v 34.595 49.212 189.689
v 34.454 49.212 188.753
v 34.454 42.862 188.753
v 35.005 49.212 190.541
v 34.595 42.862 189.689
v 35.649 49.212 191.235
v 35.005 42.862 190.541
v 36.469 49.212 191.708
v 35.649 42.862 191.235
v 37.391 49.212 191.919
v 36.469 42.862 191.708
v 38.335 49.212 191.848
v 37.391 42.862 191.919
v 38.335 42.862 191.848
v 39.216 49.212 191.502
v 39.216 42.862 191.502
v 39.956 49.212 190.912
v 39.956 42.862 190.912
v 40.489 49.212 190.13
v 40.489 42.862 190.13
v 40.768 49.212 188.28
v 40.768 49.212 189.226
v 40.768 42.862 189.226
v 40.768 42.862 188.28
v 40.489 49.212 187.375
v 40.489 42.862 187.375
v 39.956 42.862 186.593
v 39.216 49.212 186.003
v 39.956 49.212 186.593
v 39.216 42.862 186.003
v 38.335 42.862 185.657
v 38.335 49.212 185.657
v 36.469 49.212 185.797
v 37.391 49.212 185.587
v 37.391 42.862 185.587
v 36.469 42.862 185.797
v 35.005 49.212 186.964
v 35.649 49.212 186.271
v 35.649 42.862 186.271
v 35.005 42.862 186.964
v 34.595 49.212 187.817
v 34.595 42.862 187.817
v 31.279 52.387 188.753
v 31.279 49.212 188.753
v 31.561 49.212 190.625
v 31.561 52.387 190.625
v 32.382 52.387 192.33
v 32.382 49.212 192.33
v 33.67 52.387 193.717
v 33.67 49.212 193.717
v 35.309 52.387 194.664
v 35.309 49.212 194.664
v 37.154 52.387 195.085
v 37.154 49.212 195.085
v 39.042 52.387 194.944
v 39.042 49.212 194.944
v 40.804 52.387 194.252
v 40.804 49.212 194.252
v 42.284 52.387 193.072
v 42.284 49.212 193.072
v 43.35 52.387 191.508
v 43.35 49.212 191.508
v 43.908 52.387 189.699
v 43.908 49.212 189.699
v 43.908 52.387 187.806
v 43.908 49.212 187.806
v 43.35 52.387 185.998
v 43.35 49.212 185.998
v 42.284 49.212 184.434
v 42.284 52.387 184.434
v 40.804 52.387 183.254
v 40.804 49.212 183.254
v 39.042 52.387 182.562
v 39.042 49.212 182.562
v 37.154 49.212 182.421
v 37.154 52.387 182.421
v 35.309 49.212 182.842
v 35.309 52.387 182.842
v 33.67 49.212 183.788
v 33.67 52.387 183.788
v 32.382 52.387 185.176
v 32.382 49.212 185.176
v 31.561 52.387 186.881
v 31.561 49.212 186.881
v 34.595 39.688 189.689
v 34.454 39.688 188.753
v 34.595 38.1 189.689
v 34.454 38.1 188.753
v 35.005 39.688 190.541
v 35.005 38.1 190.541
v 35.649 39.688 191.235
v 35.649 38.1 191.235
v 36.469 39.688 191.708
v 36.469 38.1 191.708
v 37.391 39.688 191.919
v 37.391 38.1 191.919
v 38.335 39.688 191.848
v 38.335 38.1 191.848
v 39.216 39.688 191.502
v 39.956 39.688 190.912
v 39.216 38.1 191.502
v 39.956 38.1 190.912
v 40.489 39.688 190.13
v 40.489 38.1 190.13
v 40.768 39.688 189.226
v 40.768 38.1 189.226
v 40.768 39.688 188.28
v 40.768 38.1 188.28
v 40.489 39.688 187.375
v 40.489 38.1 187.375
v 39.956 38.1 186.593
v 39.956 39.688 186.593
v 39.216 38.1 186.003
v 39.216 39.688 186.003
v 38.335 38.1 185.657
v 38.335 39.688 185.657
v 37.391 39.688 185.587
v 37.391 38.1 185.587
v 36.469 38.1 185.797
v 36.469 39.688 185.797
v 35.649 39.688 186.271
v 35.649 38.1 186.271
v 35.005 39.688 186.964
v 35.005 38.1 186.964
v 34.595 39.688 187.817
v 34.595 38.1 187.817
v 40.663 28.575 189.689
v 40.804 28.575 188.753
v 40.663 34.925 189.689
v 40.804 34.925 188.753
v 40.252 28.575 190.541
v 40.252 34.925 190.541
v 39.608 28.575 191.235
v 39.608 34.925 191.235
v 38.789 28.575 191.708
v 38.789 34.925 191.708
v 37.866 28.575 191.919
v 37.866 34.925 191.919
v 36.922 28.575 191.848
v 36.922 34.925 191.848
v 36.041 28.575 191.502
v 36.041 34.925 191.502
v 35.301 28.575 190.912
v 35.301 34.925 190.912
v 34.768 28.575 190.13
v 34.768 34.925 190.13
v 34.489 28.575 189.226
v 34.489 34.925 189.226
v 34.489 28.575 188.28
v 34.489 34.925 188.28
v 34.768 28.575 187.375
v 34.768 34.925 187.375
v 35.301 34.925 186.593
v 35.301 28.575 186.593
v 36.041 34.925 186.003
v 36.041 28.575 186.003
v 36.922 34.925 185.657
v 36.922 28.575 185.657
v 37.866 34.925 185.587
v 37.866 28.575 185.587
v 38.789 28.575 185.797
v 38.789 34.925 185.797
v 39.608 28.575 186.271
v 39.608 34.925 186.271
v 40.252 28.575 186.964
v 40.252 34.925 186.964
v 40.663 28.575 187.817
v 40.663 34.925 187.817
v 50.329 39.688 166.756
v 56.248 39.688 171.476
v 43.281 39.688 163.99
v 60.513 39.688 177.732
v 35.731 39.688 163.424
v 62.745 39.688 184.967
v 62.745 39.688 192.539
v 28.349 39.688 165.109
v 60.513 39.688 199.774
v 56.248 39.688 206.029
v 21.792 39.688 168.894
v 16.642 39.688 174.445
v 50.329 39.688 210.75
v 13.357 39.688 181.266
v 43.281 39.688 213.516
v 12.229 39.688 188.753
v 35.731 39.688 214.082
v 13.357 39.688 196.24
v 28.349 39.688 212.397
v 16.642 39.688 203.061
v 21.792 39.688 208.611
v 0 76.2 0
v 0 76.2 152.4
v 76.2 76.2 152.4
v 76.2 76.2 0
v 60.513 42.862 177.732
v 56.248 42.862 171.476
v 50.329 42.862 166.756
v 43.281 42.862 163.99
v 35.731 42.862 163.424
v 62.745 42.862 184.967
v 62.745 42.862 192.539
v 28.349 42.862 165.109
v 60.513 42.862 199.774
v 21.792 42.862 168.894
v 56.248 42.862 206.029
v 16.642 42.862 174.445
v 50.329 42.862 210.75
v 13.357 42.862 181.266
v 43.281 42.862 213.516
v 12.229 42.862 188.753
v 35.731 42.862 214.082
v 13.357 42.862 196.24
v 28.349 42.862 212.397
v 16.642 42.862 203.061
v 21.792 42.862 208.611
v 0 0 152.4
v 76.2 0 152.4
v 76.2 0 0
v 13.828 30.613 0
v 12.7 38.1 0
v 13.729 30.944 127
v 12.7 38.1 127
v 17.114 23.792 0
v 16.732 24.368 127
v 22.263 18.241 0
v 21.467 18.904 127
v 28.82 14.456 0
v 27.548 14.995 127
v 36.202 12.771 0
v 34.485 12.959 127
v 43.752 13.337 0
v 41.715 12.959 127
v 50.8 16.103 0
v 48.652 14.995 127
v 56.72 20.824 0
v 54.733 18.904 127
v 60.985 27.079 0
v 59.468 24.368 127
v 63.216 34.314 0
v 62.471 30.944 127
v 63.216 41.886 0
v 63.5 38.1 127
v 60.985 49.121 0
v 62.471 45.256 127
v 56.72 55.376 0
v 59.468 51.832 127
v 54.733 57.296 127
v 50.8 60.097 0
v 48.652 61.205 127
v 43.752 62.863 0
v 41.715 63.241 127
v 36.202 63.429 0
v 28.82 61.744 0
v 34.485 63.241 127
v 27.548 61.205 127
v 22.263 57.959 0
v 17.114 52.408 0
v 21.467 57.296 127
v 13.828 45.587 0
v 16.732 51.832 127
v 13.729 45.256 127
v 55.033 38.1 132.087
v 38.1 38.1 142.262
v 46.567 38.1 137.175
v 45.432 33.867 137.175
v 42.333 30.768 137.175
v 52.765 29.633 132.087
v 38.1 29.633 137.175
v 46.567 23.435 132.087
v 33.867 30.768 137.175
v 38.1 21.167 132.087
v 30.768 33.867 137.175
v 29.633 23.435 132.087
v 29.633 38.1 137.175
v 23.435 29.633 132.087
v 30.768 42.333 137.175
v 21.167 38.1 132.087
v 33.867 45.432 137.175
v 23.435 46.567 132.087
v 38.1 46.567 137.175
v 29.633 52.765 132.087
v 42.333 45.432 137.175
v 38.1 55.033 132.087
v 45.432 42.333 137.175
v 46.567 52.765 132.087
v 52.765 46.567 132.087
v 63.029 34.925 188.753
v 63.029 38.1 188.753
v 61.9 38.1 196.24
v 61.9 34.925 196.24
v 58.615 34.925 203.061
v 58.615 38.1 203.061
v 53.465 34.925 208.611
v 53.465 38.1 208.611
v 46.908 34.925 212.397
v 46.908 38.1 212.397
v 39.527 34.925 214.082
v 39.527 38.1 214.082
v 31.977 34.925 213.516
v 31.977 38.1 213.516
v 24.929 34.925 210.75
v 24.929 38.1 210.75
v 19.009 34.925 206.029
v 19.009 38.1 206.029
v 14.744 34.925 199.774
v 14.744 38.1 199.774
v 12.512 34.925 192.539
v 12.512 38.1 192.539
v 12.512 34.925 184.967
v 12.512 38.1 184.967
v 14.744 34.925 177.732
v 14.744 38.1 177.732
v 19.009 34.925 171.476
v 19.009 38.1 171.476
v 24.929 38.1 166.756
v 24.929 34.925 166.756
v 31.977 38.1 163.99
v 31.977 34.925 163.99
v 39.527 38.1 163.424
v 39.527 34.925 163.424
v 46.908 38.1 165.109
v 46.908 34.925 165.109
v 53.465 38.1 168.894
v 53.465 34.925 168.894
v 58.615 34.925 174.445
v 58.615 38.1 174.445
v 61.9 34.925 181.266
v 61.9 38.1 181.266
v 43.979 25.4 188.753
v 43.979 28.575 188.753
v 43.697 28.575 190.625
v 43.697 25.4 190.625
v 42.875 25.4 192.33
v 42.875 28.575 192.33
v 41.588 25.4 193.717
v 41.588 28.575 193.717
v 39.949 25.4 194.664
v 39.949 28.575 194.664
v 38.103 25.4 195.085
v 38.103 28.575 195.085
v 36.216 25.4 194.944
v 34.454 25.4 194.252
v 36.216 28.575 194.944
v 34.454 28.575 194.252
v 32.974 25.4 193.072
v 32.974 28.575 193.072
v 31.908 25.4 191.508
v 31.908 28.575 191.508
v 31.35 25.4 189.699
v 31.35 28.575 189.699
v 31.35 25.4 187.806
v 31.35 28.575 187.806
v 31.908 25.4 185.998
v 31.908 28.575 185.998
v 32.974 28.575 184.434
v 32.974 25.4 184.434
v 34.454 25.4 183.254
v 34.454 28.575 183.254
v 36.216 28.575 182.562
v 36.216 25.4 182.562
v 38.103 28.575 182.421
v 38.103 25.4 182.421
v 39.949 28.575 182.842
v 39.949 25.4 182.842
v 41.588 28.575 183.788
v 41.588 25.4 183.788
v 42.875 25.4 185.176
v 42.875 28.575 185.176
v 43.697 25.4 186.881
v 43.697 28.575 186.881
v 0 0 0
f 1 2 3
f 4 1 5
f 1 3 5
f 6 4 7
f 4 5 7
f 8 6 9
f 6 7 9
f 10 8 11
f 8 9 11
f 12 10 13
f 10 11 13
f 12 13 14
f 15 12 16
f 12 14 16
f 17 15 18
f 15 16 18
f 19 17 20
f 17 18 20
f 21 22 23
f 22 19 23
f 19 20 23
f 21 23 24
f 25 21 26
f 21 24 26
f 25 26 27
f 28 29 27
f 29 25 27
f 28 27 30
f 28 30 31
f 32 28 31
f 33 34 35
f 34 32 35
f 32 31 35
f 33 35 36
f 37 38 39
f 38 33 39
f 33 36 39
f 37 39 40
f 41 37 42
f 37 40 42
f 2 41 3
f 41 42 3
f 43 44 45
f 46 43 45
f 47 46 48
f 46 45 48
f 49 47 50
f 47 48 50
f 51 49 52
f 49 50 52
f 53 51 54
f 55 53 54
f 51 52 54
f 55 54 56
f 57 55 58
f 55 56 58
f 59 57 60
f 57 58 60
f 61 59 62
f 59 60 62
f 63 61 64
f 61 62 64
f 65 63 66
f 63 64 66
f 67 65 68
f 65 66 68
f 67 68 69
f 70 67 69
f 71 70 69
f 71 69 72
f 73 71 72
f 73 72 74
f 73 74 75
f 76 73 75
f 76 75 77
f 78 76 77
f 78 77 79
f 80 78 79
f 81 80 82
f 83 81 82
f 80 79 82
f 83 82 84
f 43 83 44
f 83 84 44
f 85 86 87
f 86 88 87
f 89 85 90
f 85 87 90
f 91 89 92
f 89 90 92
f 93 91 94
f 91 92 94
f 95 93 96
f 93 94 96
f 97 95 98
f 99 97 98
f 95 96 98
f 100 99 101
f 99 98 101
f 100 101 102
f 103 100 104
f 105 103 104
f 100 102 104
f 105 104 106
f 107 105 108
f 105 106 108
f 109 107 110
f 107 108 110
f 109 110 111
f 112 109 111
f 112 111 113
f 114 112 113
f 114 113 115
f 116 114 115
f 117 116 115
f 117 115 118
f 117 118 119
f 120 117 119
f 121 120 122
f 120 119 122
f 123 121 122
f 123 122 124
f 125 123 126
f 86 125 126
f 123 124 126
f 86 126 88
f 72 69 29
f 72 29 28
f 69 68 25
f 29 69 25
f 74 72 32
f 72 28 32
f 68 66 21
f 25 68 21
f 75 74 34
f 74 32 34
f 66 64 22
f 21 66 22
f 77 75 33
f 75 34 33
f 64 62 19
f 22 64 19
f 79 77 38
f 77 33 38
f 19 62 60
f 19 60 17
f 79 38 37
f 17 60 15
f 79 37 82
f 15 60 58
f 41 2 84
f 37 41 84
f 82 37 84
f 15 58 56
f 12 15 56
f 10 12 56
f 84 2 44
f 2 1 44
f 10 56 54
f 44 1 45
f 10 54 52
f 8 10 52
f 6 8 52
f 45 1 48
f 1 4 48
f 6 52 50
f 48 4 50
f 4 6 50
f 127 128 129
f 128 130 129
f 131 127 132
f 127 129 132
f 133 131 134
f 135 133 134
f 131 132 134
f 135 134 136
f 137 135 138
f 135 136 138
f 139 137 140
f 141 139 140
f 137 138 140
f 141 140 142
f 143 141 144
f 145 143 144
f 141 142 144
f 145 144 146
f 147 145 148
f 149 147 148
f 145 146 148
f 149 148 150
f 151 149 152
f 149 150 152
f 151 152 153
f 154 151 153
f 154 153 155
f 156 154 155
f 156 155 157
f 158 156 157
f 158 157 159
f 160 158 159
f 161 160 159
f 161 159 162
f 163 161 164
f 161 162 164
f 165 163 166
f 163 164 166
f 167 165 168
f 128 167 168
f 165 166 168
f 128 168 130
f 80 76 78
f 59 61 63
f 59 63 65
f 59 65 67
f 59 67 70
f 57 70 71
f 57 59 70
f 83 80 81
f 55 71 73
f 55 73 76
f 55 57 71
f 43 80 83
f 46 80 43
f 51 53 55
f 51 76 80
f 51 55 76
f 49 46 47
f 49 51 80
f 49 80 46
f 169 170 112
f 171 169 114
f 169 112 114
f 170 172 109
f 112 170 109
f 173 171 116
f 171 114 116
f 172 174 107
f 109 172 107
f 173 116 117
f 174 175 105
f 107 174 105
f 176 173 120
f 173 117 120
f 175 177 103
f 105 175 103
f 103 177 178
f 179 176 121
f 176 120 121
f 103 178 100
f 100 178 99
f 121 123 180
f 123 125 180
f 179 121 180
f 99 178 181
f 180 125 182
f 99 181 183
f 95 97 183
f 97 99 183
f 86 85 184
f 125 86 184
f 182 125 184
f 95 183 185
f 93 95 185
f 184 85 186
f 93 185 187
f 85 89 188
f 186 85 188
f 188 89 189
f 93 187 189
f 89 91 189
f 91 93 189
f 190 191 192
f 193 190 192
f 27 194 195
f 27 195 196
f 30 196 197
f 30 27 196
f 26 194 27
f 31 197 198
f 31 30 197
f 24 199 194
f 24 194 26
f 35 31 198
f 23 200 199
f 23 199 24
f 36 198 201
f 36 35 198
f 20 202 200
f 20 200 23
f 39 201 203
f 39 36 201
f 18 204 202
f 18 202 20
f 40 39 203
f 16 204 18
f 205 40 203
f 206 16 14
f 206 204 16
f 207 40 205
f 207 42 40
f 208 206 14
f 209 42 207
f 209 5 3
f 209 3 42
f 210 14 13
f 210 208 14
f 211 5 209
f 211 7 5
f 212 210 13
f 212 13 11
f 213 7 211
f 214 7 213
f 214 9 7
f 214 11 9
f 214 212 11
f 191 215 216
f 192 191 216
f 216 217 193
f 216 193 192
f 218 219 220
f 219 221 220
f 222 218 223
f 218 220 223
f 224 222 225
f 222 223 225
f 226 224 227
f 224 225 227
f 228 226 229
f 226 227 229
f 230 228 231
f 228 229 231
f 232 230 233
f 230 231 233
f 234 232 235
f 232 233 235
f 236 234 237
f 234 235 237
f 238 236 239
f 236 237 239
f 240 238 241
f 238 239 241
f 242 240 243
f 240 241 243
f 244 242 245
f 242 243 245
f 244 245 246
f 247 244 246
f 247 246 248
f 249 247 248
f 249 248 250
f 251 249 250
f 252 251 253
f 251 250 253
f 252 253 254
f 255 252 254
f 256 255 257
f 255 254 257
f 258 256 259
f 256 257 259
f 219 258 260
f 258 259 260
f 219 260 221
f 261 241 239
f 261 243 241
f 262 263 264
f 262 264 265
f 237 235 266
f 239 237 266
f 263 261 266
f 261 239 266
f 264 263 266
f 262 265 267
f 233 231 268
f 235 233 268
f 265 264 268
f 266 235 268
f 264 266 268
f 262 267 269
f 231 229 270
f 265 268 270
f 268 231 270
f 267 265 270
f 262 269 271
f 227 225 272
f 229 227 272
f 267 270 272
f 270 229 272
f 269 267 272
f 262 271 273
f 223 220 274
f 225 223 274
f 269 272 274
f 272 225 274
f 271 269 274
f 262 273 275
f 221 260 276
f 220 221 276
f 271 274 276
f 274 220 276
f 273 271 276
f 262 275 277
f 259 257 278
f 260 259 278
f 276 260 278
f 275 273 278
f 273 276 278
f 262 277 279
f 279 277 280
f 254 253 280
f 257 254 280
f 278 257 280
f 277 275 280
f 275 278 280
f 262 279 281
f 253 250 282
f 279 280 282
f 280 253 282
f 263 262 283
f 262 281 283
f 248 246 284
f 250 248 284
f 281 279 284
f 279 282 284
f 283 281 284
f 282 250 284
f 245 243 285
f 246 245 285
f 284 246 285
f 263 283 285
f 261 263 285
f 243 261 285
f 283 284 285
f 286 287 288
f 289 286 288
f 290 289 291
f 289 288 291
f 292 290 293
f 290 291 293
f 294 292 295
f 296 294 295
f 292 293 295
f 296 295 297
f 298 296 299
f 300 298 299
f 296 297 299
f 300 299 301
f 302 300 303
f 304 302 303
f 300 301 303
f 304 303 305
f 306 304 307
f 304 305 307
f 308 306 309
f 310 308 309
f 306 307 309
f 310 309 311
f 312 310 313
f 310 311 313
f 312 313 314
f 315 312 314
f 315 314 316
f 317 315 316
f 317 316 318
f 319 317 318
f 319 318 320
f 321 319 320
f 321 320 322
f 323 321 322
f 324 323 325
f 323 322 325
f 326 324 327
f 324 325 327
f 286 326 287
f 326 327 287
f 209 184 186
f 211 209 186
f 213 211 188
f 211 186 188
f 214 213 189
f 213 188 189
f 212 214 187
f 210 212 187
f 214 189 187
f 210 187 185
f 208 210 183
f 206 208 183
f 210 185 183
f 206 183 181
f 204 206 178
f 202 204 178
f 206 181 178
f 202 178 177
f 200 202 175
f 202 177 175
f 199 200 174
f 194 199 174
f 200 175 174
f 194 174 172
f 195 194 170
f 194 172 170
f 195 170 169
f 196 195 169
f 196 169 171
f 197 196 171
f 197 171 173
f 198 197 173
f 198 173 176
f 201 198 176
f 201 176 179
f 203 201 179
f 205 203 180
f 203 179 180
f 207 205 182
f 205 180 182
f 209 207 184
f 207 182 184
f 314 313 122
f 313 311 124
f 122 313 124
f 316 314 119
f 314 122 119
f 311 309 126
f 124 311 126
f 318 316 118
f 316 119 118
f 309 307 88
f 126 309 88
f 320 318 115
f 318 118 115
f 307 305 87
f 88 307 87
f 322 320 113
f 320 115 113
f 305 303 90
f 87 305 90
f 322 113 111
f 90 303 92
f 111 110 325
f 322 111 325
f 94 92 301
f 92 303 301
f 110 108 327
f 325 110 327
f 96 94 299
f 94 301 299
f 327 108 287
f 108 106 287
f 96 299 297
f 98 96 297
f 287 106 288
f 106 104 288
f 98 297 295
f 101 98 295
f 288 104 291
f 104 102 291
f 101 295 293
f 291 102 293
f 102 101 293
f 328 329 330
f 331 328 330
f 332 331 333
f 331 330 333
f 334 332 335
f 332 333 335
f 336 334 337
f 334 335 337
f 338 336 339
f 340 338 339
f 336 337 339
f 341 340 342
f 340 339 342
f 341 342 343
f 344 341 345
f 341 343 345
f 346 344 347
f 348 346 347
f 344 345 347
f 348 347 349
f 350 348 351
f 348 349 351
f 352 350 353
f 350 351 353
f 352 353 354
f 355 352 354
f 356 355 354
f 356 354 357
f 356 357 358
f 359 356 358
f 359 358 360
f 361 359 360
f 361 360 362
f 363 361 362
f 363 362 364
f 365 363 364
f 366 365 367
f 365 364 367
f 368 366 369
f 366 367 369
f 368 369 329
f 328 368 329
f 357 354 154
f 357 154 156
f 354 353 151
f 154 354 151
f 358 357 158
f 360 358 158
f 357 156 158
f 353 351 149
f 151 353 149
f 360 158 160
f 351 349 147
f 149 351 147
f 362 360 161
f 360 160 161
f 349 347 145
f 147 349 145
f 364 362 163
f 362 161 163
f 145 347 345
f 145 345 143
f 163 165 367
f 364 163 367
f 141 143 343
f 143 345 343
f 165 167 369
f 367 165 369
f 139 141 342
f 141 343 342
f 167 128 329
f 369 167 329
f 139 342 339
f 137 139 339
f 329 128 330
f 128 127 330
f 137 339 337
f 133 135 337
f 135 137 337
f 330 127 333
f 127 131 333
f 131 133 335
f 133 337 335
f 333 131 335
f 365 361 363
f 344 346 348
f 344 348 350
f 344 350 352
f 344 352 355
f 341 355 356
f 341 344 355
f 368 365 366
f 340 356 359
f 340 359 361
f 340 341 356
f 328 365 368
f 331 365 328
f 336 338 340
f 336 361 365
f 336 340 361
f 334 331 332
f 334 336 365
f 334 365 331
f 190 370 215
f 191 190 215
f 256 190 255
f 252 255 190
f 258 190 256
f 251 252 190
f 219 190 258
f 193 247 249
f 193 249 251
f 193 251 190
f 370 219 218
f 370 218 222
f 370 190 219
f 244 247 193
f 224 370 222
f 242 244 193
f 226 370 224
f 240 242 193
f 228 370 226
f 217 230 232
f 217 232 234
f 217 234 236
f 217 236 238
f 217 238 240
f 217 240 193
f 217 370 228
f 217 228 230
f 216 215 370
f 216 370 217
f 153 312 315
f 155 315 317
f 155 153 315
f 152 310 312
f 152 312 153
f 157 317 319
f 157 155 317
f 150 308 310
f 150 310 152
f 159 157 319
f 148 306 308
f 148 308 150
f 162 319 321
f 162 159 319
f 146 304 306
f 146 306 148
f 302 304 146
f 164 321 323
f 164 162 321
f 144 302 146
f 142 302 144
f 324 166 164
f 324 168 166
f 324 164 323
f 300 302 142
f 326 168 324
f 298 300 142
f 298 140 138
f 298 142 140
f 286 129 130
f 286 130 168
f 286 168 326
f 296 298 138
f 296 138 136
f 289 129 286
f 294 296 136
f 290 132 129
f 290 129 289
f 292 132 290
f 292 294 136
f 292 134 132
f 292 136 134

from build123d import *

# Parameters (mm, degrees)
F0_W      = 76.2
F0_H      = 152.4
F1_DEPTH  = 76.2
F3_D      = 50.8
F3_DEPTH  = 127
F3_TIP    = 15.2618597233
F5_R      = 25.4
F7_DEPTH  = 3.175
F8_R      = 3.175
F9_DEPTH  = 1.5875
F10_R     = 3.175
F11_DEPTH = 3.175
F10_R_2   = 25.4
F12_DEPTH = 3.175
F13_R     = 3.175
F14_DEPTH = 6.35
F15_R     = 3.175
F16_DEPTH = 6.35
F17_R     = 3.175
F18_DEPTH = 3.175
F17_R_2   = 6.35
F19_DEPTH = 3.175
F20_R     = 3.175
F21_DEPTH = 3.175
F20_R_2   = 6.35
F22_DEPTH = 3.175


# Not quite as in the source:
# - the program builds the solid bodies; features that only make, move or delete a surface that nothing else refers to are left out


with BuildPart() as f1:
    # F0 (on Front) → F1 (new body)
    with BuildSketch(Plane.XZ):
        with Locations((38.1, 76.2)):
            Rectangle(F0_W, F0_H)
    extrude(amount=-F1_DEPTH)

    # F3
    with Locations(Plane(origin=(0, 0, 0), x_dir=(1, 0, 0), z_dir=(0, 0, -1))):
        with Locations((38.1, -38.1)):
            Hole(F3_D / 2, depth=F3_DEPTH)
            with Locations((0, 0, -(F3_DEPTH + F3_TIP / 2))):  # 118° drill point
                Cone(0, F3_D / 2, F3_TIP, mode=Mode.SUBTRACT)


with BuildPart() as f7:
    # F5 (on offset) → F7 (new body)
    with BuildSketch(Plane.XZ.offset(-38.1)):
        with Locations((37.628673017, 188.7528598309)):
            Circle(F5_R)
    extrude(amount=F7_DEPTH)

    # F8 (on face) → F9 (join)
    with BuildSketch(Plane(origin=(0, 38.1, 0), x_dir=(-1, 0, 0), z_dir=(0, 1, 0))):
        with Locations((-37.628673017, 188.7528598309)):
            Circle(F8_R)
    extrude(amount=F9_DEPTH)

    # F10 (on face) → F11 (join)
    with BuildSketch(Plane(origin=(0, 39.6875, 0), x_dir=(-1, 0, 0), z_dir=(0, 1, 0))):
        with Locations((-37.628673017, 188.7528598309)):
            Circle(F10_R)
    extrude(amount=F11_DEPTH)

    # F10 (on face) → F12 (join)
    with BuildSketch(Plane(origin=(0, 39.6875, 0), x_dir=(-1, 0, 0), z_dir=(0, 1, 0))):
        with Locations((-37.628673017, 188.7528598309)):
            Circle(F10_R_2)
        with Locations((-37.628673017, 188.7528598309)):
            Circle(F10_R, mode=Mode.SUBTRACT)
    extrude(amount=F12_DEPTH)

    # F13 (on face) → F14 (join)
    with BuildSketch(Plane(origin=(0, 42.8625, 0), x_dir=(-1, 0, 0), z_dir=(0, 1, 0))):
        with Locations((-37.628673017, 188.7528598309)):
            Circle(F13_R)
    extrude(amount=F14_DEPTH)

    # F15 (on face) → F16 (join)
    with BuildSketch(Plane.XZ.offset(-34.925)):
        with Locations((37.628673017, 188.7528598309)):
            Circle(F15_R)
    extrude(amount=F16_DEPTH)

    # F17 (on face) → F18 (join)
    with BuildSketch(Plane.XZ.offset(-28.575)):
        with Locations((37.628673017, 188.7528598309)):
            Circle(F17_R)
    extrude(amount=F18_DEPTH)

    # F17 (on face) → F19 (join)
    with BuildSketch(Plane.XZ.offset(-28.575)):
        with Locations((37.628673017, 188.7528598309)):
            Circle(F17_R_2)
        with Locations((37.628673017, 188.7528598309)):
            Circle(F17_R, mode=Mode.SUBTRACT)
    extrude(amount=F19_DEPTH)

    # F20 (on face) → F21 (join)
    with BuildSketch(Plane(origin=(0, 49.2125, 0), x_dir=(-1, 0, 0), z_dir=(0, 1, 0))):
        with Locations((-37.628673017, 188.7528598309)):
            Circle(F20_R)
    extrude(amount=F21_DEPTH)

    # F20 (on face) → F22 (join)
    with BuildSketch(Plane(origin=(0, 49.2125, 0), x_dir=(-1, 0, 0), z_dir=(0, 1, 0))):
        with Locations((-37.628673017, 188.7528598309)):
            Circle(F20_R_2)
    extrude(amount=F22_DEPTH)


solid = Compound([f1.part, f7.part])
